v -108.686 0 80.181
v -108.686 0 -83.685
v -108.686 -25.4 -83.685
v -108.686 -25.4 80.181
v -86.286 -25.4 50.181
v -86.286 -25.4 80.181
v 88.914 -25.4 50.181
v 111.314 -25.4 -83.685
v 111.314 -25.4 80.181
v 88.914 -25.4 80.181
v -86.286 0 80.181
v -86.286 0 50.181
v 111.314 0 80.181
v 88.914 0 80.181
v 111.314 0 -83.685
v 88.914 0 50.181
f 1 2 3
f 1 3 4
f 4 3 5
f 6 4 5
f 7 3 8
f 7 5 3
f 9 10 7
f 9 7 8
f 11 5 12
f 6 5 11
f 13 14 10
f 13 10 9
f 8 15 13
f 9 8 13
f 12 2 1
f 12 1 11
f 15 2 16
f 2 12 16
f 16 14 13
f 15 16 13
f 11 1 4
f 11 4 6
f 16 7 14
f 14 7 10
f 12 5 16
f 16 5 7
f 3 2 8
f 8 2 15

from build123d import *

# Parameters (mm, degrees)
F0_W     = 220
F0_H     = 163.86598641
F1_DEPTH = 25.4
F2_W     = 175.2
F2_H     = 30
F3_DEPTH = 57.15


# Not quite as in the source:
# - a feature names something its author has since deleted; it is built from what else it names


with BuildPart() as f1:
    # F0 (on Front) → F1 (new body)
    with BuildSketch(Plane.XZ):
        with Locations((1.3140309602, -1.7520450056)):
            Rectangle(F0_W, F0_H)
    extrude(amount=F1_DEPTH)

    # F2 (on face) → F3 (cut)
    with BuildSketch(Plane.XZ.offset(25.4)):
        with Locations((1.3140309602, 65.1809481994)):
            Rectangle(F2_W, F2_H)
    extrude(amount=-F3_DEPTH, mode=Mode.SUBTRACT)


solid = f1.part
